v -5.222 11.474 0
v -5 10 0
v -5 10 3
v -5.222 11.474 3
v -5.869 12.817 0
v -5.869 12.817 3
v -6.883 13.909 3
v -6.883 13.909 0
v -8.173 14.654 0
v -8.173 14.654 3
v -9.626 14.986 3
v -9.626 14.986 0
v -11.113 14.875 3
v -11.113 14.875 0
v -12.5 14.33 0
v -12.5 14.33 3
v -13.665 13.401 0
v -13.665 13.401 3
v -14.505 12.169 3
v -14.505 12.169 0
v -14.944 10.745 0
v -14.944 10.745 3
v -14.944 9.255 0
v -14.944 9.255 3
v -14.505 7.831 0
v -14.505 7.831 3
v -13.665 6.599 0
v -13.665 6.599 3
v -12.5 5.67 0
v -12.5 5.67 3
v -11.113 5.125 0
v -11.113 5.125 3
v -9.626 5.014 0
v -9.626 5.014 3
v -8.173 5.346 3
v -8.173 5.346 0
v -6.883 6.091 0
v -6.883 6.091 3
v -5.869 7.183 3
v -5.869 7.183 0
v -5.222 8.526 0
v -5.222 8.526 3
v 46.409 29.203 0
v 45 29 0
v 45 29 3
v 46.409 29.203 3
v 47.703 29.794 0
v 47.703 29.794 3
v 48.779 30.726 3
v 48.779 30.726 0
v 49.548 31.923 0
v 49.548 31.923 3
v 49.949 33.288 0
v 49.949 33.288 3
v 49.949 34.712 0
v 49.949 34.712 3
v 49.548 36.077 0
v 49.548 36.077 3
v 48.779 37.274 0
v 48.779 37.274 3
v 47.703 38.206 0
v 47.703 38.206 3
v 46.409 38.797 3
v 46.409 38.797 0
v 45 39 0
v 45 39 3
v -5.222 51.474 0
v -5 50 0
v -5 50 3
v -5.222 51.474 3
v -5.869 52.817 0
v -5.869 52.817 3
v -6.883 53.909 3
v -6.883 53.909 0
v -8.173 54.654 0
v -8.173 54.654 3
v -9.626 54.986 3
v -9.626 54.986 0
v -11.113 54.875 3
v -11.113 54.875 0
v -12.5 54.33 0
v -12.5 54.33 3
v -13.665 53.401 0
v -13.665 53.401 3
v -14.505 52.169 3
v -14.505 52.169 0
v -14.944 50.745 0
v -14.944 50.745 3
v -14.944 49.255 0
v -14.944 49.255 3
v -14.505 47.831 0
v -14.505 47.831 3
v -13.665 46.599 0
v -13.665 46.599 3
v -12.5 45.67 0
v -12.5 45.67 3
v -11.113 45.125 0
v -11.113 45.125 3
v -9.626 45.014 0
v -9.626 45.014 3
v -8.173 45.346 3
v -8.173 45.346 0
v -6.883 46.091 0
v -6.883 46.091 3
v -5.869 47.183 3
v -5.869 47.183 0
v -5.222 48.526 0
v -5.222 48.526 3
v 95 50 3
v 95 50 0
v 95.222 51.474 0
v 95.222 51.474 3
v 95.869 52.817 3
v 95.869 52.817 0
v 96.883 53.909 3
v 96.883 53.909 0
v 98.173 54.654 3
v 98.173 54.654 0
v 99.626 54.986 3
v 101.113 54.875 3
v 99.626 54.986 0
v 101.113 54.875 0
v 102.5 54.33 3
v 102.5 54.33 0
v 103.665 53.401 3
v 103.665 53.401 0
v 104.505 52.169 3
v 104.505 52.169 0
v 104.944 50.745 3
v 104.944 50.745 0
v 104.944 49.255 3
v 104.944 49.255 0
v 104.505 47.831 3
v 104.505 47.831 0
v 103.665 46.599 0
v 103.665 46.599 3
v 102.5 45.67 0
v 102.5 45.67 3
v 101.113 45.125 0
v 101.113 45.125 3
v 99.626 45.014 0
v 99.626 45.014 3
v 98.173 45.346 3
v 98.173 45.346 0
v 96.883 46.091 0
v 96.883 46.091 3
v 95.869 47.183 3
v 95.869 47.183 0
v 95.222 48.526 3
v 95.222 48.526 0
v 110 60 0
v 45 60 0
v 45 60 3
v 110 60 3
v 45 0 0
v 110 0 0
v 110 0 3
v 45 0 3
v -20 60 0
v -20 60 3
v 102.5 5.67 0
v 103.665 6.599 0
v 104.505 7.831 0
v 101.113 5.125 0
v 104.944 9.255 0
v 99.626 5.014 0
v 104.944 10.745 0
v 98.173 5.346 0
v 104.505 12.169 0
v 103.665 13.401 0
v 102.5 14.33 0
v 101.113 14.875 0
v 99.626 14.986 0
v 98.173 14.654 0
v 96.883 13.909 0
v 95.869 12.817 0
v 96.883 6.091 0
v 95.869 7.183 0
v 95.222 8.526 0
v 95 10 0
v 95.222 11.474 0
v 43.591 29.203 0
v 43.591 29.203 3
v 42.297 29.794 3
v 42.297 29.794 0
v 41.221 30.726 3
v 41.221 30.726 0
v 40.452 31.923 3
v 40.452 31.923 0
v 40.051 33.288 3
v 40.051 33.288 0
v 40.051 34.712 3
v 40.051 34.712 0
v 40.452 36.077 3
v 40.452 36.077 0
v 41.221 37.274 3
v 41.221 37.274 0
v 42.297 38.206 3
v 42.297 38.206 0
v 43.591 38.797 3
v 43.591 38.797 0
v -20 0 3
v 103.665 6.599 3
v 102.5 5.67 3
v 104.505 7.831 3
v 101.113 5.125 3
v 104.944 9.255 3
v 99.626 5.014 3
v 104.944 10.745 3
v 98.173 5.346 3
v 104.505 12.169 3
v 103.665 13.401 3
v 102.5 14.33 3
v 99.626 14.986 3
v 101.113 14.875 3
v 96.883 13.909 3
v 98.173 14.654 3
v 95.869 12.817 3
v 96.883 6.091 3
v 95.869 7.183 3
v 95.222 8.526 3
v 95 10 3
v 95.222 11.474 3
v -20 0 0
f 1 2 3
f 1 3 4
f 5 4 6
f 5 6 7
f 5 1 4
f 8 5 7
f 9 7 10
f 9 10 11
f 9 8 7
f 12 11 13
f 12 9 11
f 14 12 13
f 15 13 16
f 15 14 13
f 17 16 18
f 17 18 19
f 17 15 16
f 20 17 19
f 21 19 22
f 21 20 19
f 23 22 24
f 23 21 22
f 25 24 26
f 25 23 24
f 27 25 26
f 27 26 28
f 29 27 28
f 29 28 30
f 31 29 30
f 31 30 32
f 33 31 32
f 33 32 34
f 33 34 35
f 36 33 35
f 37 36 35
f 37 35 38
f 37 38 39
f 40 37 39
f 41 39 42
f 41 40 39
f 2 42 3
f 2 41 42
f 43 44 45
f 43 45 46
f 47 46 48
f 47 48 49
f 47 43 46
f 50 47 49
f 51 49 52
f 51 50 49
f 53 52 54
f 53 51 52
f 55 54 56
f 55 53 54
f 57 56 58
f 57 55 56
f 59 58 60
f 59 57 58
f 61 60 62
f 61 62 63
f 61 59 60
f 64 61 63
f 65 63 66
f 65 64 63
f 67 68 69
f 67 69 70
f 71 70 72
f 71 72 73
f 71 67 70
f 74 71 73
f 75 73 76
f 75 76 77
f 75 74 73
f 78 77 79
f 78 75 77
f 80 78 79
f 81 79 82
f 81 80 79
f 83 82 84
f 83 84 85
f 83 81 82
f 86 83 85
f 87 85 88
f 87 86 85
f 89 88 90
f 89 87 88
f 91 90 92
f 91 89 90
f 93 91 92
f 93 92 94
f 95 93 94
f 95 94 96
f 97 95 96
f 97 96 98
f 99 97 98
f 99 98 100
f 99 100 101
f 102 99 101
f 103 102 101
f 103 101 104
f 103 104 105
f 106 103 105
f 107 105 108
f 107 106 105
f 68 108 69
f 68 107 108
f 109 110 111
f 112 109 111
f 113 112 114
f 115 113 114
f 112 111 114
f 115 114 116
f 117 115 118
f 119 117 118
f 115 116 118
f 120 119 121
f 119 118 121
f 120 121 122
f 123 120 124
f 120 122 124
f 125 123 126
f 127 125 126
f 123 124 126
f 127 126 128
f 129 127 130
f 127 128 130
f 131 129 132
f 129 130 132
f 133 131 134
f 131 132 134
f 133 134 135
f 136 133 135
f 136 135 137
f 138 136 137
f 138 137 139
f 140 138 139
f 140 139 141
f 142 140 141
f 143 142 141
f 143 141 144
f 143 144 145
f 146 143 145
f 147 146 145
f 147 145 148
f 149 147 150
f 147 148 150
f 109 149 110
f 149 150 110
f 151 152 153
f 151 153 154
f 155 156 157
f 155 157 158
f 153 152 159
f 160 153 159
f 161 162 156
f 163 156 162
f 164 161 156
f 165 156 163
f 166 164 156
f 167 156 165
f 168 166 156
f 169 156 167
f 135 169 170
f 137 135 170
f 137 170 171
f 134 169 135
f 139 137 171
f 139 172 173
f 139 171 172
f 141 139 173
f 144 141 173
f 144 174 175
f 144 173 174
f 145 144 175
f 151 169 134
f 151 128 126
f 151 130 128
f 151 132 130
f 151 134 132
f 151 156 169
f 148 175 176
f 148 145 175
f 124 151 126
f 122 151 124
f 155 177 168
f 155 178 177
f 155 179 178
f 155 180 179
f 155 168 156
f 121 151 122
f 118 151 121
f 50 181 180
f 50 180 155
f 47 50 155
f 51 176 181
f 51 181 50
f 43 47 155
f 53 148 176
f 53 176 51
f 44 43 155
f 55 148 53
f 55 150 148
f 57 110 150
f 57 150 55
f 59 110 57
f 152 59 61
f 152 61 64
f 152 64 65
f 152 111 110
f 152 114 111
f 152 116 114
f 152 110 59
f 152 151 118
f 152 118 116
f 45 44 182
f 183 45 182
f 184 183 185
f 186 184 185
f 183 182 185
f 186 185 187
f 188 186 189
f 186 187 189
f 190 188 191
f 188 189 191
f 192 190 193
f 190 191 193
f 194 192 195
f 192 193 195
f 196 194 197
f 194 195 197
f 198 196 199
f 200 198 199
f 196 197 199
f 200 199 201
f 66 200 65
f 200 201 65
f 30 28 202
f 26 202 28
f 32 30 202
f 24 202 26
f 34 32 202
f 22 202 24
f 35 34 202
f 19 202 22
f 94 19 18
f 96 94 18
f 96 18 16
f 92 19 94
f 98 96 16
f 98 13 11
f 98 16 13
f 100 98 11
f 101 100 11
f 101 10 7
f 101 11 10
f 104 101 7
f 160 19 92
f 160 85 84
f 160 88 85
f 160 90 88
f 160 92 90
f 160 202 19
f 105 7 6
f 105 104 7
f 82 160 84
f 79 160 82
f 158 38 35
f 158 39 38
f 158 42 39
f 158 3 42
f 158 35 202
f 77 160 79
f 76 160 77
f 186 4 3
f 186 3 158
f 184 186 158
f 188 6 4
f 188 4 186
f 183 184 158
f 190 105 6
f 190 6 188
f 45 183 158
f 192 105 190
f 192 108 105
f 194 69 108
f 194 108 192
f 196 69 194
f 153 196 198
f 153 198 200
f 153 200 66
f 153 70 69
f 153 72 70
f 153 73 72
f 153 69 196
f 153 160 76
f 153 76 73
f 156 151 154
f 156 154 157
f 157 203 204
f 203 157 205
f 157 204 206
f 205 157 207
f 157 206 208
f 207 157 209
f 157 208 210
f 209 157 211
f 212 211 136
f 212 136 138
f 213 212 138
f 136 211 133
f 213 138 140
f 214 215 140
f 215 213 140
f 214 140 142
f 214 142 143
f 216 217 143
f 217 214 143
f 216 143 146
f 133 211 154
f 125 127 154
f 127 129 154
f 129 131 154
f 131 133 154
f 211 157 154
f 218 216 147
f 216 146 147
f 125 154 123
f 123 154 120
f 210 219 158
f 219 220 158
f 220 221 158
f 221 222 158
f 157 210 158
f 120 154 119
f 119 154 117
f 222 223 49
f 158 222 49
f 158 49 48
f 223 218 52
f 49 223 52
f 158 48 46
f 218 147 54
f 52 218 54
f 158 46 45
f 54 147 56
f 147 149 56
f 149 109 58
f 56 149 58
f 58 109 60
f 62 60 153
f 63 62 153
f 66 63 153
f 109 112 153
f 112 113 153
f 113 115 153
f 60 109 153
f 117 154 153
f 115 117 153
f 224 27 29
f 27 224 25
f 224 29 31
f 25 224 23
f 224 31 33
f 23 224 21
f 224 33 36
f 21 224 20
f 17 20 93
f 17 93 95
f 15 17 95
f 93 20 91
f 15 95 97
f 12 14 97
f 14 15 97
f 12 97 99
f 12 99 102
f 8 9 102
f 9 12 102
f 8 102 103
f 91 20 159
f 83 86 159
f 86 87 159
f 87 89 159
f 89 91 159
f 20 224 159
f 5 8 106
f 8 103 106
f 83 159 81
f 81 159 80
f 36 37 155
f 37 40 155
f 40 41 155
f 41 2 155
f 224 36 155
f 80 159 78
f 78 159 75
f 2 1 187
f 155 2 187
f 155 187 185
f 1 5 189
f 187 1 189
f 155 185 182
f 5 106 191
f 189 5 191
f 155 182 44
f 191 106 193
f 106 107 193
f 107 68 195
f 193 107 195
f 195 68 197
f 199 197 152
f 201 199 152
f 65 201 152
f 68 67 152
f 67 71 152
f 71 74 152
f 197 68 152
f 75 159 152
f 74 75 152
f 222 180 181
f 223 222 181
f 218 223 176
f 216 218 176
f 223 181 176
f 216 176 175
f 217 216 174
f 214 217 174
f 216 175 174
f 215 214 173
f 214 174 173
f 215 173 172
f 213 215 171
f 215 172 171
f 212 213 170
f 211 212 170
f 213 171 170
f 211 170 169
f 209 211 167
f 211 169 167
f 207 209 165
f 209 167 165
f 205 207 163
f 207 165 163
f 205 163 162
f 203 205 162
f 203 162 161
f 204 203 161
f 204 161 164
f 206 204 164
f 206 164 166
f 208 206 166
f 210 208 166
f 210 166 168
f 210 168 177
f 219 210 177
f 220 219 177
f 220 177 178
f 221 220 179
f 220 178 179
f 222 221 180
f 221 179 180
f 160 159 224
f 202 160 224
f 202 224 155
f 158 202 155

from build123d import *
from build123d.topology import SkipClean

# Parameters (mm, degrees)
ESQUISSE1_R        = 5
BOSS_EXTRU_1_DEPTH = 3


with BuildPart() as part:
    # Esquisse1 → Boss.-Extru.1 (new body)
    with BuildSketch(Plane.XY):
        with BuildLine():
            Line((45, 39), (45, 60))
            Line((45, 60), (-20, 60))
            Line((-20, 60), (-20, 0))
            Line((-20, 0), (45, 0))
            Line((45, 0), (45, 29))
            ThreePointArc((45, 29), (40, 34), (45, 39))
        make_face()
        with Locations((-10, 50)):
            Circle(ESQUISSE1_R, mode=Mode.SUBTRACT)
        with Locations((-10, 10)):
            Circle(ESQUISSE1_R, mode=Mode.SUBTRACT)
    boss_extru_1 = extrude(amount=BOSS_EXTRU_1_DEPTH)

    # Symétrie1: Boss.-Extru.1 across plane
    with SkipClean():  # the faces are left unmerged after this step: merging them gives an invalid solid
        add(boss_extru_1.mirror(Plane(origin=(45, 0, 3), x_dir=(0, 0, 1), z_dir=(1, 0, 0))))


solid = part.part
